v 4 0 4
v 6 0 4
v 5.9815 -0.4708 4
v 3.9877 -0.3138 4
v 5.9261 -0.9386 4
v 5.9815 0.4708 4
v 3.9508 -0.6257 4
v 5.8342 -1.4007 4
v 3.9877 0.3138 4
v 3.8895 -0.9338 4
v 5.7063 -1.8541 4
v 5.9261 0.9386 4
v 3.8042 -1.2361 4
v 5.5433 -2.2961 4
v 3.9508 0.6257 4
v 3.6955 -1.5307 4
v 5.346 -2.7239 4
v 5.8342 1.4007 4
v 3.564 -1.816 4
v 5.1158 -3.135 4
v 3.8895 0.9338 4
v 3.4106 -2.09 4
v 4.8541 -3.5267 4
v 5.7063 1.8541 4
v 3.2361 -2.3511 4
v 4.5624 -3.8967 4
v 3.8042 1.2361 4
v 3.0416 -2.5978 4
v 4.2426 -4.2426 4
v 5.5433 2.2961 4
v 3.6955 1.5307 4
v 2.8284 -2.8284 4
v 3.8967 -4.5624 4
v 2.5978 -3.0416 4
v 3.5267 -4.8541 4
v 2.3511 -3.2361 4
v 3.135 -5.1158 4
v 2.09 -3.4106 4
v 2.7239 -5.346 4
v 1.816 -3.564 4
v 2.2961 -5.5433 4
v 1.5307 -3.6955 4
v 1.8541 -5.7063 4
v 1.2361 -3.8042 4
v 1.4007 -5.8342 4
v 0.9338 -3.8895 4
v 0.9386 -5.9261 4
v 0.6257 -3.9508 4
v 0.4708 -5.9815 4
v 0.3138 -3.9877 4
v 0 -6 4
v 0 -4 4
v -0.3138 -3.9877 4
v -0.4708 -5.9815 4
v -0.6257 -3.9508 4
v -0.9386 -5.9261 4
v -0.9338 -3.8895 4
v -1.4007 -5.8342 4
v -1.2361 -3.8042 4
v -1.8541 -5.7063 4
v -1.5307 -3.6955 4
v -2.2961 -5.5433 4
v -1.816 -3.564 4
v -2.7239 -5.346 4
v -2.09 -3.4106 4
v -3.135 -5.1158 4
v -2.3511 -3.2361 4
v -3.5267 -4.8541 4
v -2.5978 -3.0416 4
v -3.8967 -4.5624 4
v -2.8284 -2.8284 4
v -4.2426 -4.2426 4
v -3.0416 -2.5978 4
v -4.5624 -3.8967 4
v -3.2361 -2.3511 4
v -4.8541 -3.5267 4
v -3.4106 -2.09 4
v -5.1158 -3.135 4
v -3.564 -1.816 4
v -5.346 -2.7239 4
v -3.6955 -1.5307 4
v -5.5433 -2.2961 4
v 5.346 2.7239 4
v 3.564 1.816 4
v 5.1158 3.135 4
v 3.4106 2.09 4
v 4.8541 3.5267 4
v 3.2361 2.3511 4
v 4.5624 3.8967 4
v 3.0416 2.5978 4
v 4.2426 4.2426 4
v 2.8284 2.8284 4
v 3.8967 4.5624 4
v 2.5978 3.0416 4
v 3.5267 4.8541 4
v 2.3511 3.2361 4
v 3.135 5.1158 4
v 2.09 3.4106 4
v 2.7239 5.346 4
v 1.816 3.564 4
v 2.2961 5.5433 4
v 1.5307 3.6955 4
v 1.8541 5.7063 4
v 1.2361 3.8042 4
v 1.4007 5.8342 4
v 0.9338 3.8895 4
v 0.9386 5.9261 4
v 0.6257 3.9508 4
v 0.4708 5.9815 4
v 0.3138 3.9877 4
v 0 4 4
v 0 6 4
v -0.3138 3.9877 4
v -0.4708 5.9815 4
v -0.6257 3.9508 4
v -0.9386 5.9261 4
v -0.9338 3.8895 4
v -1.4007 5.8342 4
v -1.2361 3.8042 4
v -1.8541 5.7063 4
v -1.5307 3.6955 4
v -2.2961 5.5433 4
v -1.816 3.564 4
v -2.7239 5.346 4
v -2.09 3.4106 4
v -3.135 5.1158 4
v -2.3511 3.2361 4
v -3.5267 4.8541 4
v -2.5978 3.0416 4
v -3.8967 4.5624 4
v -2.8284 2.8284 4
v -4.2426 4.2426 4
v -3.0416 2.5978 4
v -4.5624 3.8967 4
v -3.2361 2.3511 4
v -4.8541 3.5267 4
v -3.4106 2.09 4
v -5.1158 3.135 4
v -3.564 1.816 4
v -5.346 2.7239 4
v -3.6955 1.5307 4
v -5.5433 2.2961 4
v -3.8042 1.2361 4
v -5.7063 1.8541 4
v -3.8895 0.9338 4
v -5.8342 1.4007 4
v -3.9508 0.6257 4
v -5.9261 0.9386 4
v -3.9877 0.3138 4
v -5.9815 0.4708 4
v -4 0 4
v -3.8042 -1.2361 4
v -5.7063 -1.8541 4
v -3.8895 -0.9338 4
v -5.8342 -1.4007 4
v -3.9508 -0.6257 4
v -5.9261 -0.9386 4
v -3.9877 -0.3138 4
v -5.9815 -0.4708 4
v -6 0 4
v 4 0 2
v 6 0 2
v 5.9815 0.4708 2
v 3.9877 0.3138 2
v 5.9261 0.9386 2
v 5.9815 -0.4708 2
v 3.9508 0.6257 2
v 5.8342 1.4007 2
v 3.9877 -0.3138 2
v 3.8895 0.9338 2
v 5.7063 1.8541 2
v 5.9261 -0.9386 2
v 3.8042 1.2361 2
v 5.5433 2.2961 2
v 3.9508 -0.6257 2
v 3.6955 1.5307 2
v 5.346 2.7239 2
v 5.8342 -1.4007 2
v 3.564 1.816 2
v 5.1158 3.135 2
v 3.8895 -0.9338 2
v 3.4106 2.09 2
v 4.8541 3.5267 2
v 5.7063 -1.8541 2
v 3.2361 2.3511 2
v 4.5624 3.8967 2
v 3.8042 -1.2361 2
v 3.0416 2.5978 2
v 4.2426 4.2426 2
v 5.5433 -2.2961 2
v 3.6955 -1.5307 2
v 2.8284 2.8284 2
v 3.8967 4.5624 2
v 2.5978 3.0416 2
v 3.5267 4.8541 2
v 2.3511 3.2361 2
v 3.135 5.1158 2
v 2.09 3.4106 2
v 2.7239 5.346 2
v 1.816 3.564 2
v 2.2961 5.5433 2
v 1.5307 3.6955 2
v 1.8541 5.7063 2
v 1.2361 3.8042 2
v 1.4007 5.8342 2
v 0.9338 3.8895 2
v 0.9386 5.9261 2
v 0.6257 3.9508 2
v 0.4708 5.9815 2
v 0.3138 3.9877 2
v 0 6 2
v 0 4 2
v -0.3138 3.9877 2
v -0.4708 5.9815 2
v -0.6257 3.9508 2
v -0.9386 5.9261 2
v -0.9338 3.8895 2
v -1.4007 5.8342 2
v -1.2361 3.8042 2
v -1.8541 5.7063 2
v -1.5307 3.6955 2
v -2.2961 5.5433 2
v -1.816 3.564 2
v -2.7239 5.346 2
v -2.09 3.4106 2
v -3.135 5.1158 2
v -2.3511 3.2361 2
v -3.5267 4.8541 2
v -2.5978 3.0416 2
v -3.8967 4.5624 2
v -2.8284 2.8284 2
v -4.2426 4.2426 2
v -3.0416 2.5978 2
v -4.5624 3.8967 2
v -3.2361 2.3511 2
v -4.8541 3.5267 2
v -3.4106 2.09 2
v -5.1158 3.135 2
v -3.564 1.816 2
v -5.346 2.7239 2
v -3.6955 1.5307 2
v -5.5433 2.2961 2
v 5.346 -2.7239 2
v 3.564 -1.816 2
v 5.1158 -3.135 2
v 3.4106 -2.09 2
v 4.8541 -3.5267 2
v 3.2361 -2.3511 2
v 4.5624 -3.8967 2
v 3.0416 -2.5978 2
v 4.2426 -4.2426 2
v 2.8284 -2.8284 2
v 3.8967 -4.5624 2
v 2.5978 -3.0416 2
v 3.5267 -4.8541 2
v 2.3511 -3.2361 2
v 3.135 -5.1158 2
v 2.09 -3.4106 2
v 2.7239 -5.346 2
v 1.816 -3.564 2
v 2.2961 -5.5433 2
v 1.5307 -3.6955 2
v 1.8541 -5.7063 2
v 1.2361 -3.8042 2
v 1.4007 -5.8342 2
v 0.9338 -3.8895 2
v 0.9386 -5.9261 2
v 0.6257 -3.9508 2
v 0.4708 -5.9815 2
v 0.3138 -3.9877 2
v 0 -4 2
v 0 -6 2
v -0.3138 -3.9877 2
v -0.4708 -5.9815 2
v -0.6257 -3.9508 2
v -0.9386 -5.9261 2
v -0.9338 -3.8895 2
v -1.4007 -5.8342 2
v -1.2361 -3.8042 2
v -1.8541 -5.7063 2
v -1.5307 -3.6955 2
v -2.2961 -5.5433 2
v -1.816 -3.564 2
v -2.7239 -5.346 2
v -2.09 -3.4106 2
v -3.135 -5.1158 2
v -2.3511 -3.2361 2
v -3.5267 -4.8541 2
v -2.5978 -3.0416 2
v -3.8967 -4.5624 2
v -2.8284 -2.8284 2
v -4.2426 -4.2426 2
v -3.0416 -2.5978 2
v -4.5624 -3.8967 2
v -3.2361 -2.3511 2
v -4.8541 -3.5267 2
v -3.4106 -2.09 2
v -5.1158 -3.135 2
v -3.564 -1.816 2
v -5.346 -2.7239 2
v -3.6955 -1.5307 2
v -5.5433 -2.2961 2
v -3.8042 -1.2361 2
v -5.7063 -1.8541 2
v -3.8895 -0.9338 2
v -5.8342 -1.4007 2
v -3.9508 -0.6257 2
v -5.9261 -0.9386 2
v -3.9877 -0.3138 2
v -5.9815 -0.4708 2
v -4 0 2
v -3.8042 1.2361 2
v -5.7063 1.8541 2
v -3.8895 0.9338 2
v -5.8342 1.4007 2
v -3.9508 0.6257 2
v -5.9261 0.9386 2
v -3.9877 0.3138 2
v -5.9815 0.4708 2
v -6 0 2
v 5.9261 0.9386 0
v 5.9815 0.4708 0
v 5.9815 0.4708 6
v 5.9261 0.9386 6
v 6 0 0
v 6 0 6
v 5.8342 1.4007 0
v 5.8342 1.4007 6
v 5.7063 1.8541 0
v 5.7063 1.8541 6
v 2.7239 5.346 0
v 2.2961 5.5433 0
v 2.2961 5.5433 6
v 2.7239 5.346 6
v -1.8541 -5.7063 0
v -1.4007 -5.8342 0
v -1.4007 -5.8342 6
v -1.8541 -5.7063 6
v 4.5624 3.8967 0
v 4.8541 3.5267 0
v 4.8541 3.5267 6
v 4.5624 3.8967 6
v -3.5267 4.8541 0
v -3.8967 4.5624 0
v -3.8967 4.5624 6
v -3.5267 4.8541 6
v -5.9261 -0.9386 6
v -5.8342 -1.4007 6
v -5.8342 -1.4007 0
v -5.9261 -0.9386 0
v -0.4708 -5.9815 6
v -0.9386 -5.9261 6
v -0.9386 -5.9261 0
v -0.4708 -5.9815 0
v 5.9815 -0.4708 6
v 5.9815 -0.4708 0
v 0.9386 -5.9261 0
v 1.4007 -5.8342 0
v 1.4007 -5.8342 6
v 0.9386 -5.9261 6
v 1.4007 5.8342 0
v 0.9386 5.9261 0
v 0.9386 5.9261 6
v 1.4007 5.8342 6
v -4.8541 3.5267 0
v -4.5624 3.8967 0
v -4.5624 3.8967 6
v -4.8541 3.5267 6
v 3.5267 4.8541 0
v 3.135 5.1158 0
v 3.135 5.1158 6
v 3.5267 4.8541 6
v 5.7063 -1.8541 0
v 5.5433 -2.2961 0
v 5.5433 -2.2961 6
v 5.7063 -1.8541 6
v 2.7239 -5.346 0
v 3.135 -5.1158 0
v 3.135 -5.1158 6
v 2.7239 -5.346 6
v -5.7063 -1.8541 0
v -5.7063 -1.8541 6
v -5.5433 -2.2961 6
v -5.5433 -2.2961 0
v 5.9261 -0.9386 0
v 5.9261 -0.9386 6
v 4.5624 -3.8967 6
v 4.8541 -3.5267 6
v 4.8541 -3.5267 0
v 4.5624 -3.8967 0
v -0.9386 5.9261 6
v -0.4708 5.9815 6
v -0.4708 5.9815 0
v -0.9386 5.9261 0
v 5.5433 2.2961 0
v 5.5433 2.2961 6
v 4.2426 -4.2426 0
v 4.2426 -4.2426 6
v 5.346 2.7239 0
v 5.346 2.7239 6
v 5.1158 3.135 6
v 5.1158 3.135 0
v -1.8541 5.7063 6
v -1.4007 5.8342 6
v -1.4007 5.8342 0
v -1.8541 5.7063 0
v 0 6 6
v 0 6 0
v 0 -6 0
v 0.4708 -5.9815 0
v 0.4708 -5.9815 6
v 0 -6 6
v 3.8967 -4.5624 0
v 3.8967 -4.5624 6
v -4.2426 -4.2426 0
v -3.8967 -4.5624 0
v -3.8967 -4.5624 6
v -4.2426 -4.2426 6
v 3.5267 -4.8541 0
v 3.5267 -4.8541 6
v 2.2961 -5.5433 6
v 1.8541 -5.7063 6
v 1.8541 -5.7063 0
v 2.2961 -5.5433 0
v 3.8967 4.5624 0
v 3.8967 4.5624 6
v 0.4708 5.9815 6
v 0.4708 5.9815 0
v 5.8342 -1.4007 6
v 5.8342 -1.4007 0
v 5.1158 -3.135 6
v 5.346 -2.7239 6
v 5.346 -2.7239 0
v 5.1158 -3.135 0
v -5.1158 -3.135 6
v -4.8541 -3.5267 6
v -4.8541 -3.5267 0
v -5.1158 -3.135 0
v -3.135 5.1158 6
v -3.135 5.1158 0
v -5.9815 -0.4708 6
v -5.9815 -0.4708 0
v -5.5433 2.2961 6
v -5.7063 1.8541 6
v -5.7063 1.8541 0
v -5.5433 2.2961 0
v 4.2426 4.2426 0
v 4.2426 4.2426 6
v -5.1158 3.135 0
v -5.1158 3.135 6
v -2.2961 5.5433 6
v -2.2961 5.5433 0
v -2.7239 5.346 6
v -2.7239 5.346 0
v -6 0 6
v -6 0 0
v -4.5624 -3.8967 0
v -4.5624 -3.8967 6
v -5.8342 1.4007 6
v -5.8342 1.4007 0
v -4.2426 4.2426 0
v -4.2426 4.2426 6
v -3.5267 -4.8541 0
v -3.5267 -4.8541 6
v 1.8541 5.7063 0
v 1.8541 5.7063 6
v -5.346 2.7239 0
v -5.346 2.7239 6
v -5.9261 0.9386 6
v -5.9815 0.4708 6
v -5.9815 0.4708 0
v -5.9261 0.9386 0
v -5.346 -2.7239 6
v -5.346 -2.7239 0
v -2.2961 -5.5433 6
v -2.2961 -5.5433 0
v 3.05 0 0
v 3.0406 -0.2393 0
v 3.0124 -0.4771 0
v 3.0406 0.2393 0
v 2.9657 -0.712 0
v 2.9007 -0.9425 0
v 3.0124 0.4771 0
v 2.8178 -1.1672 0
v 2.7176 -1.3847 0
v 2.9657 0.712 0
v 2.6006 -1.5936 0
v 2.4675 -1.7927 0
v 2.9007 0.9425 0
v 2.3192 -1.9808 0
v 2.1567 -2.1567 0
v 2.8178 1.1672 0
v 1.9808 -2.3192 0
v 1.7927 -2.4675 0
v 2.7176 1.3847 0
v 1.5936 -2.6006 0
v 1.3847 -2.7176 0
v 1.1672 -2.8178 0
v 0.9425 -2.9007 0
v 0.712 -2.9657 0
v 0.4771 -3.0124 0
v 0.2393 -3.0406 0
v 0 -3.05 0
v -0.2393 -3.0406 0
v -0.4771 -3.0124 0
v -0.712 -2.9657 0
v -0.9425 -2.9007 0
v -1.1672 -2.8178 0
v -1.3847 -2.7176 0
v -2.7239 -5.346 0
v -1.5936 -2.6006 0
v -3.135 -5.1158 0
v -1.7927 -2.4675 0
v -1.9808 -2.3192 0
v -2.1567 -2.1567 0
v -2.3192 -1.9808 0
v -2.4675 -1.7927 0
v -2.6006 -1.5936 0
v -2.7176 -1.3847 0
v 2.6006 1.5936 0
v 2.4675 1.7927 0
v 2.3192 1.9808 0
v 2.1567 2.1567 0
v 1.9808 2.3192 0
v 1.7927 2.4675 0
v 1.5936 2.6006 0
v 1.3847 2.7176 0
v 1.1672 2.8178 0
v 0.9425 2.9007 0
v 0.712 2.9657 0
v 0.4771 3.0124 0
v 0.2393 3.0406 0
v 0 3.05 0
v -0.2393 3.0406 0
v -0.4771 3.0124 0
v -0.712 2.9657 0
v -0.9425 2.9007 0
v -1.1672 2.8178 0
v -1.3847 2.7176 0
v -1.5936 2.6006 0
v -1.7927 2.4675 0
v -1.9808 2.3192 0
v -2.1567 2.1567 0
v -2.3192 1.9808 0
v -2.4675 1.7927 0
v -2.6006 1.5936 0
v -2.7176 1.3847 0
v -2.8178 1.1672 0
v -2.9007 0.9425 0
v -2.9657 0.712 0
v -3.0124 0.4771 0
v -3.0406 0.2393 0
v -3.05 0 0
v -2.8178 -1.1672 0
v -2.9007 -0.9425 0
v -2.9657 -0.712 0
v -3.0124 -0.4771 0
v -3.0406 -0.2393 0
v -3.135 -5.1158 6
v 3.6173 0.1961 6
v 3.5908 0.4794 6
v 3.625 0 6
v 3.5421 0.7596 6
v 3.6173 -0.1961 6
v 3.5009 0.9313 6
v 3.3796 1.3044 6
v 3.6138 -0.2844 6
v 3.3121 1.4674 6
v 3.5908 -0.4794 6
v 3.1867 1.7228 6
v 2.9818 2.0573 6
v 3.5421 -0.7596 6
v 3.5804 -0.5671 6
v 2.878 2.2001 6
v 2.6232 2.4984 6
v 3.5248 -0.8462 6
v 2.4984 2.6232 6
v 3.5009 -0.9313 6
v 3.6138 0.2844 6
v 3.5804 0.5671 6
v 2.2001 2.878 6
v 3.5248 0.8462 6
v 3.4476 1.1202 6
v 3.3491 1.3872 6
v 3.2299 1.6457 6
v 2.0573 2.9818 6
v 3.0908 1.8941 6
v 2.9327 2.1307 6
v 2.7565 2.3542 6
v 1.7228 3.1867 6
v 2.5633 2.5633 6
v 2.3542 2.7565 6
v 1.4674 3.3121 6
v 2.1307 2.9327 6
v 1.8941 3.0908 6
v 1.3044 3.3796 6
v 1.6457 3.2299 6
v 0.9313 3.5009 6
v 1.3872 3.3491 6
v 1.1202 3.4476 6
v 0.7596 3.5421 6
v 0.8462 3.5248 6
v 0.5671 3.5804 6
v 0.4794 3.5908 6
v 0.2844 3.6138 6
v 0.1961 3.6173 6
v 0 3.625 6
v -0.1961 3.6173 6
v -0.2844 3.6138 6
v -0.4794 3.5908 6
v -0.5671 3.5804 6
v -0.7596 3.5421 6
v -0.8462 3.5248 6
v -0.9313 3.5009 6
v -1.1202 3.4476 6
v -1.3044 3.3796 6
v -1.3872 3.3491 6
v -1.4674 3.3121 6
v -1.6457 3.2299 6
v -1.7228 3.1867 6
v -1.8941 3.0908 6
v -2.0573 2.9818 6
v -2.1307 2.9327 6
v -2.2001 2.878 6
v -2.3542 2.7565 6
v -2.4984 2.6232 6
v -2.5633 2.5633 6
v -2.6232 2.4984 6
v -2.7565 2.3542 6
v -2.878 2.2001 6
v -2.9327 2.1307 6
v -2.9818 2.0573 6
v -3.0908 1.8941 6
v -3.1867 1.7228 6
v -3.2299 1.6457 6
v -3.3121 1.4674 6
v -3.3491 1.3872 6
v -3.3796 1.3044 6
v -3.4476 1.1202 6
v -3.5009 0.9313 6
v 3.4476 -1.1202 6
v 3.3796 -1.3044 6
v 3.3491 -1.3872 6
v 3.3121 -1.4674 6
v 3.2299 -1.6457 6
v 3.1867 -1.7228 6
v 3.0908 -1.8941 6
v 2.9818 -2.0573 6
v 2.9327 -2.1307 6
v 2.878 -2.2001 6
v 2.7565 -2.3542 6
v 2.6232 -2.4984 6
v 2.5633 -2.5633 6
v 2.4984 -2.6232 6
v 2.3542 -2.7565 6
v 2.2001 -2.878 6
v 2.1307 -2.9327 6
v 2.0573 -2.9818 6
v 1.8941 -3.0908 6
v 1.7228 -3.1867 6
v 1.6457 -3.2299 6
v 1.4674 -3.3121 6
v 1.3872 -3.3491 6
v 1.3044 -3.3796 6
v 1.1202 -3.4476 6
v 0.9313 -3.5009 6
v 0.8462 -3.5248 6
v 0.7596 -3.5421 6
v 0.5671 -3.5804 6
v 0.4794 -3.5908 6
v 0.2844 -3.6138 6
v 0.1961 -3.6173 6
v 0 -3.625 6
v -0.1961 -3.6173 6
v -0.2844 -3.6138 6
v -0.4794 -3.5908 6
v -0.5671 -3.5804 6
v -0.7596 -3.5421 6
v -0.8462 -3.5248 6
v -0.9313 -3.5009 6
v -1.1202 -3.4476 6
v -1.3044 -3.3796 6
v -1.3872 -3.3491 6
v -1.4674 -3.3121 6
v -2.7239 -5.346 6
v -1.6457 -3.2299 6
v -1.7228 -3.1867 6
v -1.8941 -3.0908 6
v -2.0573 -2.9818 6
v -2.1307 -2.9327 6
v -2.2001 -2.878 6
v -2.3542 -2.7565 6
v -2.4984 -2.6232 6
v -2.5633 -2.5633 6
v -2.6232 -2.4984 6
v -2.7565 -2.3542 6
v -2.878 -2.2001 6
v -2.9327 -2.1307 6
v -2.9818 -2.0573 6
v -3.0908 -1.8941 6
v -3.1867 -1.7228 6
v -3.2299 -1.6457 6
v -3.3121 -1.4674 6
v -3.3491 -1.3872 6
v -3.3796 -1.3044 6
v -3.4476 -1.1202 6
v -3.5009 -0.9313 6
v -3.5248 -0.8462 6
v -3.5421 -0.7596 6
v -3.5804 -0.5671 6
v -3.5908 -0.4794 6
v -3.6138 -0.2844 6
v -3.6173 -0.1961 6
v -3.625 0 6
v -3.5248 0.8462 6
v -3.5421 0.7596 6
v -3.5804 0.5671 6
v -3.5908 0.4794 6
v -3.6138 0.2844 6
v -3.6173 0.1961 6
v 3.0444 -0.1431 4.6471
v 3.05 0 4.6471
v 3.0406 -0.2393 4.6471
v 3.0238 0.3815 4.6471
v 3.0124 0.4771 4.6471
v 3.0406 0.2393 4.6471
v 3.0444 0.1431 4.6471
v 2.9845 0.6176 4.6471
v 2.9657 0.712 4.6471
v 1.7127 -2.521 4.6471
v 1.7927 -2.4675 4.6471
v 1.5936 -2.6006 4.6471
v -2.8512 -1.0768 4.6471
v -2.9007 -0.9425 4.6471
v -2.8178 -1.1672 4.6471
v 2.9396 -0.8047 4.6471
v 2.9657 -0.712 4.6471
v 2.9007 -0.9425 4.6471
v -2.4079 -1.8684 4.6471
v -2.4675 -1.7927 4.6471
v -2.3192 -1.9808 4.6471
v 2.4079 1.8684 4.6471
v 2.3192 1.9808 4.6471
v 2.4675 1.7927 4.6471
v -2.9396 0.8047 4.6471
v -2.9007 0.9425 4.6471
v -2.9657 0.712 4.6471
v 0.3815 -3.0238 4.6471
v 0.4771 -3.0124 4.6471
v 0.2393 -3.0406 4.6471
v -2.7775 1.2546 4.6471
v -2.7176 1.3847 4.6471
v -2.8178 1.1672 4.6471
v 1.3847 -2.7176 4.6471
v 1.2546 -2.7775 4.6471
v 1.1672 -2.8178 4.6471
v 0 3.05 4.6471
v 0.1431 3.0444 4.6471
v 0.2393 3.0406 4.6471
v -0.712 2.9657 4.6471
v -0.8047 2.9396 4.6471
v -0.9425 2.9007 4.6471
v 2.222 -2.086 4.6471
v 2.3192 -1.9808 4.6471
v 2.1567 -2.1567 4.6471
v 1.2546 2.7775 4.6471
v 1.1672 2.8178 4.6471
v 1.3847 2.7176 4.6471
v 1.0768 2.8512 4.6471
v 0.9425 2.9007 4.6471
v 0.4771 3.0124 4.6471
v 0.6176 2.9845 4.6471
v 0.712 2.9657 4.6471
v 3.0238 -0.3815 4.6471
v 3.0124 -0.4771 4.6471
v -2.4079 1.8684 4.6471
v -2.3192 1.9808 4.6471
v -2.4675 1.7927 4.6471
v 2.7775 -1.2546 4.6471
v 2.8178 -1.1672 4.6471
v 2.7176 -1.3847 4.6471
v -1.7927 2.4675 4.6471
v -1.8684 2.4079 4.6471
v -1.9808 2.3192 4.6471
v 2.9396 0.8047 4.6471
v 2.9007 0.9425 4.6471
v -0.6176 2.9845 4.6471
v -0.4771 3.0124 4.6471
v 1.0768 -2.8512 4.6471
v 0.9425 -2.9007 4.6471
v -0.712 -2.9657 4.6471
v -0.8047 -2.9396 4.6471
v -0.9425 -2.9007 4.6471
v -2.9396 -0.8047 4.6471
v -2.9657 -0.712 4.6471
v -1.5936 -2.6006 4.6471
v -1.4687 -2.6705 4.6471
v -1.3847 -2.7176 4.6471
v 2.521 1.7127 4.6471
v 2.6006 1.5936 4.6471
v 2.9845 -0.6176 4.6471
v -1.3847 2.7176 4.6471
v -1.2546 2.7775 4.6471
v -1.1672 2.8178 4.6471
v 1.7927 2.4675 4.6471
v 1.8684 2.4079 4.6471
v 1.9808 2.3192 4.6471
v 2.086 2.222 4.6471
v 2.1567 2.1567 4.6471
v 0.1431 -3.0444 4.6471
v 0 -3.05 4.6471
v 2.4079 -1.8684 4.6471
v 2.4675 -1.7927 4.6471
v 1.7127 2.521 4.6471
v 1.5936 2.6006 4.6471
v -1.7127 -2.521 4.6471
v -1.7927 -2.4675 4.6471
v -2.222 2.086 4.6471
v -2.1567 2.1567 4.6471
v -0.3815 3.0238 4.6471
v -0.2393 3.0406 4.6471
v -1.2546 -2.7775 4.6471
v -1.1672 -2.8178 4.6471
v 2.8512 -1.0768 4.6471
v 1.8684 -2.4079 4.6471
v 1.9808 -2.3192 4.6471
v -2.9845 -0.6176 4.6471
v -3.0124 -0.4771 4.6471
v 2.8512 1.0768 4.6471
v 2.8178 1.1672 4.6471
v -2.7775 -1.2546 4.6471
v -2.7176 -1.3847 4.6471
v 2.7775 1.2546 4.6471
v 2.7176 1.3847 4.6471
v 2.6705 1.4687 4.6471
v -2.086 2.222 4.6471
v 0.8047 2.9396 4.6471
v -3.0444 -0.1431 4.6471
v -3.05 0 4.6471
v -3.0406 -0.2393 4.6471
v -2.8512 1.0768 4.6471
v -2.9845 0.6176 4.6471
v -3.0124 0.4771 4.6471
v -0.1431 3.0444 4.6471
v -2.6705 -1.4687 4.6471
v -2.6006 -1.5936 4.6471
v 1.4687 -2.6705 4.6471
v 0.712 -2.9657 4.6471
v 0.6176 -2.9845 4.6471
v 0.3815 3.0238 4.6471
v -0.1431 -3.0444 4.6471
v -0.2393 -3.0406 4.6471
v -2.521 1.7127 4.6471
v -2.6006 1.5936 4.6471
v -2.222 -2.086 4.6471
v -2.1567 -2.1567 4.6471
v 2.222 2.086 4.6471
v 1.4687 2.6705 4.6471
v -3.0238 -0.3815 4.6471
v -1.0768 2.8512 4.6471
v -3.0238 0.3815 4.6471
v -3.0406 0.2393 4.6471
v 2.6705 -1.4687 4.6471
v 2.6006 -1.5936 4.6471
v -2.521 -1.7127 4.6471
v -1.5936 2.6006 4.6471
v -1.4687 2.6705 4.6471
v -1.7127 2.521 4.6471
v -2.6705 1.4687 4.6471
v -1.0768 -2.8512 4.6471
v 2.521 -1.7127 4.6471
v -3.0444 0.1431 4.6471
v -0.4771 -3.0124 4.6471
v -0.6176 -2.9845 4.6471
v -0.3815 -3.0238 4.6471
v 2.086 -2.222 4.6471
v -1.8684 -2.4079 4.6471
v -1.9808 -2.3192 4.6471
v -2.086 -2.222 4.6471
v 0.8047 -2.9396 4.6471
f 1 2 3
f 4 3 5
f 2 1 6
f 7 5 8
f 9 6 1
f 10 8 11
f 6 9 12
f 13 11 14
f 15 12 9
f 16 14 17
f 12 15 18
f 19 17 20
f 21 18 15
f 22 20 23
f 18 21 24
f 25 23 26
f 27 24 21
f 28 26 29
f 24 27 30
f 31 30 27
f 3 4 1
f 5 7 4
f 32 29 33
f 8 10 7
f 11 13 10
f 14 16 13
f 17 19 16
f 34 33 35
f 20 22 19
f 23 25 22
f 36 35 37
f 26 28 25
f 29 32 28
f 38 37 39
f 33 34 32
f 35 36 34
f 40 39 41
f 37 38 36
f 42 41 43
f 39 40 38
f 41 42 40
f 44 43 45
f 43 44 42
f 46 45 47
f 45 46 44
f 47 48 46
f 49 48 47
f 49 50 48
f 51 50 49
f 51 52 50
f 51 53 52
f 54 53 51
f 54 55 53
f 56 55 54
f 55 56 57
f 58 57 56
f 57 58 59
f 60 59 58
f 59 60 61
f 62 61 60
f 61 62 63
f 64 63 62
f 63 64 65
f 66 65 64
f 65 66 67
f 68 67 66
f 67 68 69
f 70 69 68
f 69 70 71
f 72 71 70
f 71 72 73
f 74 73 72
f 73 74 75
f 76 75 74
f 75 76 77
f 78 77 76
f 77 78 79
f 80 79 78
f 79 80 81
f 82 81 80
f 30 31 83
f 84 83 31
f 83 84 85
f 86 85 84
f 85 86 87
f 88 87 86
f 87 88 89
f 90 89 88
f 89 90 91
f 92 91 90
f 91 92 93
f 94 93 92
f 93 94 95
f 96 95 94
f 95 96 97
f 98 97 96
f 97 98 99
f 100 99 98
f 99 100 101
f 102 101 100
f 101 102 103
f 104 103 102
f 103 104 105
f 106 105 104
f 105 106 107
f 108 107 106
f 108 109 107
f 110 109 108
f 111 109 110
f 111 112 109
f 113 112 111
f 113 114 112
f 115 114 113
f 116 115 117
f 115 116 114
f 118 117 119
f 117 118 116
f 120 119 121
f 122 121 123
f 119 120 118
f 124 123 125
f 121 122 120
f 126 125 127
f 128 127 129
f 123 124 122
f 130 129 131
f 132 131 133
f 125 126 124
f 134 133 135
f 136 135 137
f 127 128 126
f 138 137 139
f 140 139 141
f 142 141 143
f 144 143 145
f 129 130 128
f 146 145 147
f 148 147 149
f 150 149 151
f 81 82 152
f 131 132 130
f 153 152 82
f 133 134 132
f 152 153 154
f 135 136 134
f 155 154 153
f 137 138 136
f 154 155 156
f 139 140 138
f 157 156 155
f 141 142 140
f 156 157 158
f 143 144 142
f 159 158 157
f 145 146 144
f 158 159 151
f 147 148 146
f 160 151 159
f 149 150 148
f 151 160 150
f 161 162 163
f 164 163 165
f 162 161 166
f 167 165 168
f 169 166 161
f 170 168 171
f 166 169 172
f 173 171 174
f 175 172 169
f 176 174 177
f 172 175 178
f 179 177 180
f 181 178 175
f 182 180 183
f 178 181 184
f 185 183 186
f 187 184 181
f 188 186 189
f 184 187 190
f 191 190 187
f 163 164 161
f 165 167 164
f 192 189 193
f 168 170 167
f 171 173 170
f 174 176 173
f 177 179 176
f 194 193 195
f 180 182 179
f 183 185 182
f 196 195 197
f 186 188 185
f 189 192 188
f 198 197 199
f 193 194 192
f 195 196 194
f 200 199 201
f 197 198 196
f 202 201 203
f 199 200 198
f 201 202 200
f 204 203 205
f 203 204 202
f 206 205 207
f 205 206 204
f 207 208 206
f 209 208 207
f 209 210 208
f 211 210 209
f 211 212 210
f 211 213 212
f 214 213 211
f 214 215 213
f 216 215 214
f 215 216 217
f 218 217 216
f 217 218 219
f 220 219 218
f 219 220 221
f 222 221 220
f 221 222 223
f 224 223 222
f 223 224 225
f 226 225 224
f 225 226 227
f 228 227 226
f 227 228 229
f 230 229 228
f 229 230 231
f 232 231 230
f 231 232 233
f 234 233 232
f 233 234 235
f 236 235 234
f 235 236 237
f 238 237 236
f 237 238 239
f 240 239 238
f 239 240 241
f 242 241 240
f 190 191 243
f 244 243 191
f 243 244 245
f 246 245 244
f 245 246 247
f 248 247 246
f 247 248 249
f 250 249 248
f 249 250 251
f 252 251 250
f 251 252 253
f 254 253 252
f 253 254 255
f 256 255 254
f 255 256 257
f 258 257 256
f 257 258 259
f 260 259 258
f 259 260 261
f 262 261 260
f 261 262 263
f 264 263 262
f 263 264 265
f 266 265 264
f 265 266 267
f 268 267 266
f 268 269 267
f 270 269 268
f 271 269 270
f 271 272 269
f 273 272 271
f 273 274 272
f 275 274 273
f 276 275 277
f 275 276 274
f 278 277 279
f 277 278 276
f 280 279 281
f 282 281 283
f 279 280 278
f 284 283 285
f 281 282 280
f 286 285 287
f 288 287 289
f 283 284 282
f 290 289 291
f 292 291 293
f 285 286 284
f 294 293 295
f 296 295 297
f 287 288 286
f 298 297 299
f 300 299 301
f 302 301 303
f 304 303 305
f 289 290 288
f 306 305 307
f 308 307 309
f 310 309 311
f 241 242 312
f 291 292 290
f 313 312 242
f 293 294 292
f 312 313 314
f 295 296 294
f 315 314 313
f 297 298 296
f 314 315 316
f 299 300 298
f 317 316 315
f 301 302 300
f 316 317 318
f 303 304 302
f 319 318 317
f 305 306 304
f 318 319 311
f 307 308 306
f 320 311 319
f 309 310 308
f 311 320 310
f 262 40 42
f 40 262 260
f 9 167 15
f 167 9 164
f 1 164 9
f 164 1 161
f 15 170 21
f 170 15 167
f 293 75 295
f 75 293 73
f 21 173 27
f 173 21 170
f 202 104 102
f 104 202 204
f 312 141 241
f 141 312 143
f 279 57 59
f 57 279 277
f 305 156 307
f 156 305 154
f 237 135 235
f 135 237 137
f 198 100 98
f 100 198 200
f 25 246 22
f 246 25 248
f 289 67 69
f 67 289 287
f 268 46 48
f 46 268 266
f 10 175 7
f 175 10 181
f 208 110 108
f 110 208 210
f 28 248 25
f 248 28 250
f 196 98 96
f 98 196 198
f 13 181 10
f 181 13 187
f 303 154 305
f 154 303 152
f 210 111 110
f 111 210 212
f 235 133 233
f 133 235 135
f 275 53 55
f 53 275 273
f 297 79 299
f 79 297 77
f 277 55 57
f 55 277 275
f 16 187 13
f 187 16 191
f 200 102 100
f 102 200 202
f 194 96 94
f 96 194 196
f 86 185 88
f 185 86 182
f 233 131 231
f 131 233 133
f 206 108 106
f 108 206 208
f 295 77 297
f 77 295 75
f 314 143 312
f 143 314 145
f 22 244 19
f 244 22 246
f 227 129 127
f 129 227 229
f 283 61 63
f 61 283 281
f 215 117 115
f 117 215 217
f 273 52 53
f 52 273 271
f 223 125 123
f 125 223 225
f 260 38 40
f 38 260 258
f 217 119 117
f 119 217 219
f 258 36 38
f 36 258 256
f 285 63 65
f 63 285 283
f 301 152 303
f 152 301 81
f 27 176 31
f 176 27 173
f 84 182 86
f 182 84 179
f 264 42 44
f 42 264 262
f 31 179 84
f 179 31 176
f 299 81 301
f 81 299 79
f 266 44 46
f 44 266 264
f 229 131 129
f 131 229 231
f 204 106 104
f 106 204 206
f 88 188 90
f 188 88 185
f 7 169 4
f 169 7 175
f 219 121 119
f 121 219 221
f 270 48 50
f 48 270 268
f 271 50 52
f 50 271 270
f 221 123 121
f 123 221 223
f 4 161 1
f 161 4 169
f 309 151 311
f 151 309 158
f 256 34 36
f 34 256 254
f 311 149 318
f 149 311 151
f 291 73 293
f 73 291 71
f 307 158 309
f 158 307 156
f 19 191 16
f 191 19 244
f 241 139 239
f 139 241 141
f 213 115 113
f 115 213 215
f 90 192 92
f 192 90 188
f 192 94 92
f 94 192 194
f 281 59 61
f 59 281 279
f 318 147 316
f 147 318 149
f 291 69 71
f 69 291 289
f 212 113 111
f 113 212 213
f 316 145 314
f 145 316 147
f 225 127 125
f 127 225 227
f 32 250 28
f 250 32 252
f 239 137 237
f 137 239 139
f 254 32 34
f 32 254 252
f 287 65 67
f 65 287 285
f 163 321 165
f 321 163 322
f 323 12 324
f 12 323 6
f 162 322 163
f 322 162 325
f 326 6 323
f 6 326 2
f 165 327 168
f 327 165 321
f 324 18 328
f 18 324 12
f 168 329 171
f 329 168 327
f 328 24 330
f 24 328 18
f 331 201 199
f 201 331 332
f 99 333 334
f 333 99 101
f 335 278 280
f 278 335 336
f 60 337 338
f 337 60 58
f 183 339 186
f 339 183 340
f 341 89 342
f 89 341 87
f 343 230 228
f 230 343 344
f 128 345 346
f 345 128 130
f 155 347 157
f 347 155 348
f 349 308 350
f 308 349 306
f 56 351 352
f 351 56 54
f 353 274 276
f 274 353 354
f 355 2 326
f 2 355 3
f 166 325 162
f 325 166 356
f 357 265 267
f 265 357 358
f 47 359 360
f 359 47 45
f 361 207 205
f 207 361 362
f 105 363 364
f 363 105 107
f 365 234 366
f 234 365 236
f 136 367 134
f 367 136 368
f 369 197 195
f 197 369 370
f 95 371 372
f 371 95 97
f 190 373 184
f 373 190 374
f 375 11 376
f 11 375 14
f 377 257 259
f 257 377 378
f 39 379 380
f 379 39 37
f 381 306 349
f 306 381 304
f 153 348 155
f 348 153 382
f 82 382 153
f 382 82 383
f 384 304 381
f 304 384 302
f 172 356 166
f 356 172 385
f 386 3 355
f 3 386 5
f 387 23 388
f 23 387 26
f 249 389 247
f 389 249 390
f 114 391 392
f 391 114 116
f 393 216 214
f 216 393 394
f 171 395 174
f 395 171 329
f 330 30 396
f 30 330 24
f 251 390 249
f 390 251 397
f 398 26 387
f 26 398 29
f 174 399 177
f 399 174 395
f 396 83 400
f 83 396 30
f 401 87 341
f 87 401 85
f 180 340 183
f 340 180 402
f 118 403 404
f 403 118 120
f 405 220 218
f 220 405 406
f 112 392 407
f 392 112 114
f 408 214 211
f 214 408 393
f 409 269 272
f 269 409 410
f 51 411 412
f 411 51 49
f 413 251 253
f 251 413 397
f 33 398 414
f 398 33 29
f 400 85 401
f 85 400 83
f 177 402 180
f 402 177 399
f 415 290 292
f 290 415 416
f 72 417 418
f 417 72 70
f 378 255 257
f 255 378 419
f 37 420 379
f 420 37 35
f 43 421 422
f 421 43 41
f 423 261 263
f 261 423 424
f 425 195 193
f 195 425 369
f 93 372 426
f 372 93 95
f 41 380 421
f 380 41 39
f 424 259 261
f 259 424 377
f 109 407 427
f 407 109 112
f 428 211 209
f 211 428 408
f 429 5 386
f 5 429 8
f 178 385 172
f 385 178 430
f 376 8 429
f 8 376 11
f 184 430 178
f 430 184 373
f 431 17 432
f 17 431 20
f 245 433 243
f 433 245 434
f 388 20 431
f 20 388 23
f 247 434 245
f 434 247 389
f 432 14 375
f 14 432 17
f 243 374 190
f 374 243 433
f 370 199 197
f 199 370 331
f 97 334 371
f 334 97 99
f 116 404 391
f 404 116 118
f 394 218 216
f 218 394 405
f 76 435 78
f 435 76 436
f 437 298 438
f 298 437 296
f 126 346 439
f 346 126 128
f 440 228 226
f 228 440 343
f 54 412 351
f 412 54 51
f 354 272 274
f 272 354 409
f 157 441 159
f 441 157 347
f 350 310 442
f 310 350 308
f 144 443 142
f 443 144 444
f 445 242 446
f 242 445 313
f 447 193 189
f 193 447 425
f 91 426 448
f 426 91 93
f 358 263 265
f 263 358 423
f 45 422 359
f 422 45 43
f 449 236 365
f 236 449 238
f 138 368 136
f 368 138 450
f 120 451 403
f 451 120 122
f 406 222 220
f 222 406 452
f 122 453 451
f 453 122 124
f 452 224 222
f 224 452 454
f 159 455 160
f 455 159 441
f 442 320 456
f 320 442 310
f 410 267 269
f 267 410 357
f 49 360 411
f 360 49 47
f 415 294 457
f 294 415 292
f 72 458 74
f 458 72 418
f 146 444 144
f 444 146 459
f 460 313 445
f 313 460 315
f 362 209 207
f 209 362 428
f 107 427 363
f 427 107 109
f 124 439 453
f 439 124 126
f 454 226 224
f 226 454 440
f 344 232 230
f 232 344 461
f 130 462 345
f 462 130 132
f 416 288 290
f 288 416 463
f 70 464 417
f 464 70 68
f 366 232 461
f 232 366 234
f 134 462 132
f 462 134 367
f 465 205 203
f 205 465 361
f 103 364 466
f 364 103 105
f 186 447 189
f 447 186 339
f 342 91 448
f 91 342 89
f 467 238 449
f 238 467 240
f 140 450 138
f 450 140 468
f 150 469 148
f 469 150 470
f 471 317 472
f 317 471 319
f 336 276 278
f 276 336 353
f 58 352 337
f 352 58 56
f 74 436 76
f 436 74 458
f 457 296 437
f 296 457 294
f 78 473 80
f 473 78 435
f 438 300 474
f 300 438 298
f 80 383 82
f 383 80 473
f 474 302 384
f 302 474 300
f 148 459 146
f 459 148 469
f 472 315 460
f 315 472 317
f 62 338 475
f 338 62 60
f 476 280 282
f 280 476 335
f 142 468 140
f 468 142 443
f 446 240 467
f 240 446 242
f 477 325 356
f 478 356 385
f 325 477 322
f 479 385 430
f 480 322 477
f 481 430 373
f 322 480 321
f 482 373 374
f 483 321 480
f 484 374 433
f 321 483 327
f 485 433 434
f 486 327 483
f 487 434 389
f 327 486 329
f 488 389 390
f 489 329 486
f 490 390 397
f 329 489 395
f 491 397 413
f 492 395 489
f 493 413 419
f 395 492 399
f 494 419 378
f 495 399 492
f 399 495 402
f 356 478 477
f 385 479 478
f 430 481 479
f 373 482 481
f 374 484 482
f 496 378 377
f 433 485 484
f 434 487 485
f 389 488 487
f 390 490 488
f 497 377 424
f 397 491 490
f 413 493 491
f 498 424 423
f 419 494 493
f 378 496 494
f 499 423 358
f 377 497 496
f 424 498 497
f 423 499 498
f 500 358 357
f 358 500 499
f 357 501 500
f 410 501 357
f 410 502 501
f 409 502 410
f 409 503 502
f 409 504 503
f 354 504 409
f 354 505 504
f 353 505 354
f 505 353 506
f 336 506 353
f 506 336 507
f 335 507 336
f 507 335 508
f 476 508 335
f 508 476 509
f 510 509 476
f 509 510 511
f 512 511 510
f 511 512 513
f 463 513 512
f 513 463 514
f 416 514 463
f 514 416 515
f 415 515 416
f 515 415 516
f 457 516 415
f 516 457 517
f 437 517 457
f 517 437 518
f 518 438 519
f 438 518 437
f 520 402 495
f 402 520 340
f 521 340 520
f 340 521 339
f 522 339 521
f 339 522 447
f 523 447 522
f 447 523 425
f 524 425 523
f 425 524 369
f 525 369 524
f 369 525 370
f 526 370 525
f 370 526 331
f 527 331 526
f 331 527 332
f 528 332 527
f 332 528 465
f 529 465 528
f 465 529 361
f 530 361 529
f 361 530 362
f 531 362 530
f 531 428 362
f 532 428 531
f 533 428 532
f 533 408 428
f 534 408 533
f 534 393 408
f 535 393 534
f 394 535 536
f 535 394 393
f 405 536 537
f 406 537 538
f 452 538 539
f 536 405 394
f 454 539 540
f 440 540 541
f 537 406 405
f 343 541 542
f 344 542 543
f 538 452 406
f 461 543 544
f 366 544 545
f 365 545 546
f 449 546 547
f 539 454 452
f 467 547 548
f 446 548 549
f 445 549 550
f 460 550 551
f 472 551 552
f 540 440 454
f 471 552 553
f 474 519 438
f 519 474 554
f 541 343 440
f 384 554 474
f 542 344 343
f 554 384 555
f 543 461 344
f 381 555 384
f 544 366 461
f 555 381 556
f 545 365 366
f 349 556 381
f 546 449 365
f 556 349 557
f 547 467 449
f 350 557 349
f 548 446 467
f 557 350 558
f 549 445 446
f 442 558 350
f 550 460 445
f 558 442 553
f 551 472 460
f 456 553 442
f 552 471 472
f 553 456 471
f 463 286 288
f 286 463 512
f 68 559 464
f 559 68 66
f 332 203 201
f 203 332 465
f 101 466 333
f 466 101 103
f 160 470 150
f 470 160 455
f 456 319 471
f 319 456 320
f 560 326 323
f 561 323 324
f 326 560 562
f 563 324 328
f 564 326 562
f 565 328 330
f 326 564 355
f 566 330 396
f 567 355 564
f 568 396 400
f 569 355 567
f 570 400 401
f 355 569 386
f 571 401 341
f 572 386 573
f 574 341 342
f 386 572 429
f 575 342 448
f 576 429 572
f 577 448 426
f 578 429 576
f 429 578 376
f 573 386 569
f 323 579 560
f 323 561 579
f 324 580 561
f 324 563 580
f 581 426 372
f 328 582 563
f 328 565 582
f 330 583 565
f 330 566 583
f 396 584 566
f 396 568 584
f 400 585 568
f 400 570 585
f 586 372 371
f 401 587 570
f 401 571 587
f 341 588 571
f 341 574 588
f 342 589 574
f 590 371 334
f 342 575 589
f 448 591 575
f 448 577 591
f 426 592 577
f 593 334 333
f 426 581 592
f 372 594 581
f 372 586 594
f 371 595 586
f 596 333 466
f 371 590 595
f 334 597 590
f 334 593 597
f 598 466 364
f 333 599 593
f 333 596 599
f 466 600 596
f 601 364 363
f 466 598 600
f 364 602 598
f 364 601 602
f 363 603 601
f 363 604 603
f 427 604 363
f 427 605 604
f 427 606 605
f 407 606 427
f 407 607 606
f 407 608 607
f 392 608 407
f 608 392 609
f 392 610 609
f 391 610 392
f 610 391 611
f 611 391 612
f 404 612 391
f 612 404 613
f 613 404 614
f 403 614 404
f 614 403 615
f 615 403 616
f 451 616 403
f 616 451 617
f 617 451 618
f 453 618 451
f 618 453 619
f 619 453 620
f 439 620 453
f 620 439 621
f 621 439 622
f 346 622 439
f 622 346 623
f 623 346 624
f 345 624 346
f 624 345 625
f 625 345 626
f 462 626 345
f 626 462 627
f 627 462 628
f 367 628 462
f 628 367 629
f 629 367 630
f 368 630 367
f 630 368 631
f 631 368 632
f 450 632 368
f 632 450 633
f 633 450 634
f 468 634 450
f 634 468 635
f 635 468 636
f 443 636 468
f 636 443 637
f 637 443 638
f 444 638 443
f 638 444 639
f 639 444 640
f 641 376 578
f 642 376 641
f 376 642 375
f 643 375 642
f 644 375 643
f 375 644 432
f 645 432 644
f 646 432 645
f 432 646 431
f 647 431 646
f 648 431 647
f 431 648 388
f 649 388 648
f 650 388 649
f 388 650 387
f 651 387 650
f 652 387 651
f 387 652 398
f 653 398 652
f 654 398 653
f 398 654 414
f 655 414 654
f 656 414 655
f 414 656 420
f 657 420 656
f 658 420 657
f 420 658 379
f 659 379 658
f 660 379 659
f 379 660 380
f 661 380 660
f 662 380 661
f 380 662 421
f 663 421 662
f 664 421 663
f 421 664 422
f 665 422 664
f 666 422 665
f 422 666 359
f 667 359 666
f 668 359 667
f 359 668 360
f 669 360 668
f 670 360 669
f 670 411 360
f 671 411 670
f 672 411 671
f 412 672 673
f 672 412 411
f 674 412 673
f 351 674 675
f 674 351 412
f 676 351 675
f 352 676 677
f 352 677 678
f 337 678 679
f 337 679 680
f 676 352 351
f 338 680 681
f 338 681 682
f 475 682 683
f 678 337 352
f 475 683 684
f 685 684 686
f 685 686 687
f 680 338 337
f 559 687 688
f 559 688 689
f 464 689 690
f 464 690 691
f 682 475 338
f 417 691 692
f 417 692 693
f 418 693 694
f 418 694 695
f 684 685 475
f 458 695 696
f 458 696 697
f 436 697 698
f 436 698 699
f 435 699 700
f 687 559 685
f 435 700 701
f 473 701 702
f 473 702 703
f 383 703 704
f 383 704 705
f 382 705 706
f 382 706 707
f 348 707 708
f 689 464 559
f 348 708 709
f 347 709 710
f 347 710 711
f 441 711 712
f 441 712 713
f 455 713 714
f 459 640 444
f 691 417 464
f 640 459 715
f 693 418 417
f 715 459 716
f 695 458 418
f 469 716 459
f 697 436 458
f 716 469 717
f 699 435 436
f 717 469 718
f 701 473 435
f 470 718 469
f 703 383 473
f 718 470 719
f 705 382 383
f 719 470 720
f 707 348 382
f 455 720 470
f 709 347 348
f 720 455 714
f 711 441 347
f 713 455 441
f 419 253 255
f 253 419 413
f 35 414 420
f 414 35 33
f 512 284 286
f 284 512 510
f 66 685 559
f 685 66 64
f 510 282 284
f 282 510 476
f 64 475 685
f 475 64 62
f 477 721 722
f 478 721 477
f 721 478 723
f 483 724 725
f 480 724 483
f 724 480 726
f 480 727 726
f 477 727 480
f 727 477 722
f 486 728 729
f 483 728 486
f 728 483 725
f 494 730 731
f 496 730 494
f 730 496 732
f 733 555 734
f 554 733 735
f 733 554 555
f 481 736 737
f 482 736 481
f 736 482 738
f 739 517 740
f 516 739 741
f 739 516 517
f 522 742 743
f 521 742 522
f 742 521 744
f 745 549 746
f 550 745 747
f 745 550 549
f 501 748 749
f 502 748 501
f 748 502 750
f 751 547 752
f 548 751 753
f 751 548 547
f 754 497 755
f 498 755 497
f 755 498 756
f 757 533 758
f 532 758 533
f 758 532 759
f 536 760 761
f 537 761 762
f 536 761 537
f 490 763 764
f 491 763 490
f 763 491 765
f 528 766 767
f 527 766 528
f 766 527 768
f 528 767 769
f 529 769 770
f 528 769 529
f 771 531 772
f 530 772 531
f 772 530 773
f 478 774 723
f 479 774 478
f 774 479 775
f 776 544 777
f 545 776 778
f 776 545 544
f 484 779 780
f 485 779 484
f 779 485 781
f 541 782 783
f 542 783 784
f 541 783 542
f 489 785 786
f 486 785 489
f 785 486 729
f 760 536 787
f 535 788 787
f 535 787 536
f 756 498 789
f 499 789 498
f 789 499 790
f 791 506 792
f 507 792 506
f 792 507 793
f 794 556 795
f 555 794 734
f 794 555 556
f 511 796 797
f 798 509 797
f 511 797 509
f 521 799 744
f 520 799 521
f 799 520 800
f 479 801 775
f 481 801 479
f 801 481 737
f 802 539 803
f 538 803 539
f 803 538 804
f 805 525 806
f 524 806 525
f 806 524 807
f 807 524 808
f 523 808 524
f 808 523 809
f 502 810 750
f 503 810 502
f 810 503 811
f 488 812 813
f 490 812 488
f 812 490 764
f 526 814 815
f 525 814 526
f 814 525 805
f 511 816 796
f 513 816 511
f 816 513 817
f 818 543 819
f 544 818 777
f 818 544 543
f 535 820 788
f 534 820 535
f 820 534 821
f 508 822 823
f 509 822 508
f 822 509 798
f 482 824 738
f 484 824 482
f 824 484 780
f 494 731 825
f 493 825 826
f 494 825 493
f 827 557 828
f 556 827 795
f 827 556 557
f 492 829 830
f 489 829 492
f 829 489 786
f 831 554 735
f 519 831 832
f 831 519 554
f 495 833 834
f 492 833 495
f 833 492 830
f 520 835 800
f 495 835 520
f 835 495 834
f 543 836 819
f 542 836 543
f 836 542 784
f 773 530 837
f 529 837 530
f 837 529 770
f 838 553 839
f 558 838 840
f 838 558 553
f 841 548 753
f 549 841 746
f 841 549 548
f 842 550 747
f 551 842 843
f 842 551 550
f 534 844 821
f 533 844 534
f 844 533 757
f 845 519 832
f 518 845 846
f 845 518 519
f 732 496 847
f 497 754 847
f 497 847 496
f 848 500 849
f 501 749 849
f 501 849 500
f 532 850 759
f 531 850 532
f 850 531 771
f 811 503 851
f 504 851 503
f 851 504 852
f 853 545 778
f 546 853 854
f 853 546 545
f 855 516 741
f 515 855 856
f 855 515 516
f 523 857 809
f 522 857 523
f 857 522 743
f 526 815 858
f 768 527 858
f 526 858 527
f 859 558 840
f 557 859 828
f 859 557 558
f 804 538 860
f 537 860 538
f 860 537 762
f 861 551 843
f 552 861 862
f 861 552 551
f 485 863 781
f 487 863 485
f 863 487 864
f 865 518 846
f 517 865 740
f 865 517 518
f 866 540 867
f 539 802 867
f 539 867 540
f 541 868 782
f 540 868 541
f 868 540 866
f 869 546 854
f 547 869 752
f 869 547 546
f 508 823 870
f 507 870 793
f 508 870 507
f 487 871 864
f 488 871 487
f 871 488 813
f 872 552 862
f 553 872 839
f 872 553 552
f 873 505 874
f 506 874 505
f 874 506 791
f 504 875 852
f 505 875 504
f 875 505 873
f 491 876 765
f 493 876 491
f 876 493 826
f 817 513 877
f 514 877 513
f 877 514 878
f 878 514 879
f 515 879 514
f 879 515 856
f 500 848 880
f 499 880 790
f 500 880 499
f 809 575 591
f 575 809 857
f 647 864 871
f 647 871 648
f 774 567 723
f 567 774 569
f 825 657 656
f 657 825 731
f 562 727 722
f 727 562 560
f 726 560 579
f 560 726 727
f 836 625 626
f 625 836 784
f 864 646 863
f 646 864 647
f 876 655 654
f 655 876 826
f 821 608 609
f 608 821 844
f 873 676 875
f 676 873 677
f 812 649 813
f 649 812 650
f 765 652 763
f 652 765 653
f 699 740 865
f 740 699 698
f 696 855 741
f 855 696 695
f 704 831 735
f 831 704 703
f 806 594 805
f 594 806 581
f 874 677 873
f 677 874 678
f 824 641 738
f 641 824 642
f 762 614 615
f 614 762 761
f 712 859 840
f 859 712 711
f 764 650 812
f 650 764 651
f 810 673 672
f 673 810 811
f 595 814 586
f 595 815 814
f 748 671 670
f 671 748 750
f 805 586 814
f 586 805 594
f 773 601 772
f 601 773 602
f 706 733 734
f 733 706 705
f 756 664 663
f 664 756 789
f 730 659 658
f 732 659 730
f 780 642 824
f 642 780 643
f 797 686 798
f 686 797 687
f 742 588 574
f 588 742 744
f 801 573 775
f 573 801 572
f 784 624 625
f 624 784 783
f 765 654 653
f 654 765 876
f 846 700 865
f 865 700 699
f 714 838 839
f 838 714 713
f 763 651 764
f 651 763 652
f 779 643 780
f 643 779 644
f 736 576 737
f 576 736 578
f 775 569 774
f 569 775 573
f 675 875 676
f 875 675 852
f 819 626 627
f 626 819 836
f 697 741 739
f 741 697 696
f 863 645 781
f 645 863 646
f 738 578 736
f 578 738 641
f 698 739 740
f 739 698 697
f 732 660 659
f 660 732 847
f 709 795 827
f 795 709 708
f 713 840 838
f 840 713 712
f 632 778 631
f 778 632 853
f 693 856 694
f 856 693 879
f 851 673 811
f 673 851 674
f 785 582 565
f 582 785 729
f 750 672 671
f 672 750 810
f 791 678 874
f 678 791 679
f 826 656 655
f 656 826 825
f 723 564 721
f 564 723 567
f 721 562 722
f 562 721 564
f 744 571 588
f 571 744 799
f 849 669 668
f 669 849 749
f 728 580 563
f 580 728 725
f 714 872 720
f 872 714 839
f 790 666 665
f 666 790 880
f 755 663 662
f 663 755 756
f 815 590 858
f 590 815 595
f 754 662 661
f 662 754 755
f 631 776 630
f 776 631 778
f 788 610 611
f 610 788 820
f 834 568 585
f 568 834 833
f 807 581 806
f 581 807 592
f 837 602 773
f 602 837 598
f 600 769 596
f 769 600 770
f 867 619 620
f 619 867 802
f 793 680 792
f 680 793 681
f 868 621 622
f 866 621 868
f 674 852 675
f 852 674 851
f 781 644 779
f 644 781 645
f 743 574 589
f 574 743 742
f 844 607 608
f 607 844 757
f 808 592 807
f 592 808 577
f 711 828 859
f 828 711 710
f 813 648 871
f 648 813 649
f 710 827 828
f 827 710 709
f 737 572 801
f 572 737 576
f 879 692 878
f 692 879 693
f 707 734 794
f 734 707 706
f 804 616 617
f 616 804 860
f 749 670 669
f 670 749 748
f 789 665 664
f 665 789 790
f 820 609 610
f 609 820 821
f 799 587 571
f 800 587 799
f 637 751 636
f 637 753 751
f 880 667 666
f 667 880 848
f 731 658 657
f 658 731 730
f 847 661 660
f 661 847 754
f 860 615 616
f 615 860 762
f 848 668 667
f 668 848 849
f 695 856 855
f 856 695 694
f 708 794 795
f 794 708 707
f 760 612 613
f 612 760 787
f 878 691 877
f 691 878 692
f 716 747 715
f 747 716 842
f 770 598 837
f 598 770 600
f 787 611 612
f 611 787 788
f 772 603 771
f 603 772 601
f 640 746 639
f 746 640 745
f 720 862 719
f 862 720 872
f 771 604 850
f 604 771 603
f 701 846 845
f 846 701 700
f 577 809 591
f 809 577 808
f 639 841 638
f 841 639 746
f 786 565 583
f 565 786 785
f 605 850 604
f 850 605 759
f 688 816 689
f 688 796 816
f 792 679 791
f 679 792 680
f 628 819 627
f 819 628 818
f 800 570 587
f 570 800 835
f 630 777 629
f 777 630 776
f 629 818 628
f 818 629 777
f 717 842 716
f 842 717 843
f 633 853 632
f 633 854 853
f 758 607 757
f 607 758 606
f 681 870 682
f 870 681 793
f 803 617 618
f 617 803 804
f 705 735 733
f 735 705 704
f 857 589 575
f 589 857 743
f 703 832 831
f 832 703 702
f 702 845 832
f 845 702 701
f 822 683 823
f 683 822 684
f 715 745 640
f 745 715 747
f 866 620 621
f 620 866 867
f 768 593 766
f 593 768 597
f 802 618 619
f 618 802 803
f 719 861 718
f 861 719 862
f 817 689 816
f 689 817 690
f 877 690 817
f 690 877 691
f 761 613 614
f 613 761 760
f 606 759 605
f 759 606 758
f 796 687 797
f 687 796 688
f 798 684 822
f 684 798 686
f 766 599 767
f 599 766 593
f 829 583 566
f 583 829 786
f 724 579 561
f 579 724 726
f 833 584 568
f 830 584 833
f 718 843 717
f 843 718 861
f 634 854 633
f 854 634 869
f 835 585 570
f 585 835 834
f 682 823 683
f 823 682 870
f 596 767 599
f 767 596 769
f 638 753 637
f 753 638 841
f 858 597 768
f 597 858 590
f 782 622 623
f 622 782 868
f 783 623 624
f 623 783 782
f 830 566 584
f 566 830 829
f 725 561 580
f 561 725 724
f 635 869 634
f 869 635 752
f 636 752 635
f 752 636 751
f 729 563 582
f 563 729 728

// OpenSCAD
//*******************************************************************************
// PARAMETRIC GROMMET 
//------------------------
// Written by Mark C. 2017
// Built using OpenSCAD 2015.03-2
// V1 : Released 
// 
//*******************************************************************************
//-------------------------------------------------------------------------------
//                             Description
//-------------------------------------------------------------------------------
//Type...: Utility Part
//Notes..: Parametric Grommet
// Material ... : Print from TPU Flexible
//-------------------------------------------------------------------------------
//                             PARAMETERS
//-------------------------------------------------------------------------------

// Overall Grommet Diameter
Overall_Diameter = 12;
// Thickness of the Grommet
Grommet_Thickness = 6;
// Cable Hole Diameter 
Cable_Hole_Diameter = 6 ;
// Cable Hole Depth : Default = 20 Set this to 0 if you want a blanked Grommet to drill out later
Cable_Hole_Depth = 20 ;
// Adjust the Depth of the outer cable hole chamfer Default is 3
Cable_Hole_Chamfer_Depth = 3;
// Specify the Chassis thickness you are plugging through - The Chassis Hole size = Cable_Hole_Diameter + 2
Chassis_Thickness = 2;
Chassis_Hole_Diameter = Cable_Hole_Diameter + 2;
// Adjust Fitting tolerance if needed to allow for 3D Printer drift
Fitting_Tolerance = 0.1;
// Smoothing Factor for a Higher Resolution Mesh Output
Smoothing_Factor = 80;

$fn = Smoothing_Factor;

//-------------------------------------------------------------------------------
//                             MAIN CODE
//-------------------------------------------------------------------------------
difference(){
   cylinder (h=Grommet_Thickness , d1=Overall_Diameter , d2=Overall_Diameter); // Overall Grommet
     
   translate([0,0,-5]) cylinder(h=Cable_Hole_Depth , d=Cable_Hole_Diameter+Fitting_Tolerance); // Cable Hole
    
    difference(){
     translate([0,0,Grommet_Thickness/2-Chassis_Thickness/2]) cylinder (h=Chassis_Thickness , d1=Overall_Diameter+5 , d2=Overall_Diameter+5); // Chassis Groove
    translate([0,0,-5]) cylinder(h=50 , d=Chassis_Hole_Diameter); // Chassis Groove Inner Wall
    }
    translate([0,0,Grommet_Thickness-5]) cylinder(h=20,d1=Cable_Hole_Chamfer_Depth,d2=20); // Outer Chamfer
};
